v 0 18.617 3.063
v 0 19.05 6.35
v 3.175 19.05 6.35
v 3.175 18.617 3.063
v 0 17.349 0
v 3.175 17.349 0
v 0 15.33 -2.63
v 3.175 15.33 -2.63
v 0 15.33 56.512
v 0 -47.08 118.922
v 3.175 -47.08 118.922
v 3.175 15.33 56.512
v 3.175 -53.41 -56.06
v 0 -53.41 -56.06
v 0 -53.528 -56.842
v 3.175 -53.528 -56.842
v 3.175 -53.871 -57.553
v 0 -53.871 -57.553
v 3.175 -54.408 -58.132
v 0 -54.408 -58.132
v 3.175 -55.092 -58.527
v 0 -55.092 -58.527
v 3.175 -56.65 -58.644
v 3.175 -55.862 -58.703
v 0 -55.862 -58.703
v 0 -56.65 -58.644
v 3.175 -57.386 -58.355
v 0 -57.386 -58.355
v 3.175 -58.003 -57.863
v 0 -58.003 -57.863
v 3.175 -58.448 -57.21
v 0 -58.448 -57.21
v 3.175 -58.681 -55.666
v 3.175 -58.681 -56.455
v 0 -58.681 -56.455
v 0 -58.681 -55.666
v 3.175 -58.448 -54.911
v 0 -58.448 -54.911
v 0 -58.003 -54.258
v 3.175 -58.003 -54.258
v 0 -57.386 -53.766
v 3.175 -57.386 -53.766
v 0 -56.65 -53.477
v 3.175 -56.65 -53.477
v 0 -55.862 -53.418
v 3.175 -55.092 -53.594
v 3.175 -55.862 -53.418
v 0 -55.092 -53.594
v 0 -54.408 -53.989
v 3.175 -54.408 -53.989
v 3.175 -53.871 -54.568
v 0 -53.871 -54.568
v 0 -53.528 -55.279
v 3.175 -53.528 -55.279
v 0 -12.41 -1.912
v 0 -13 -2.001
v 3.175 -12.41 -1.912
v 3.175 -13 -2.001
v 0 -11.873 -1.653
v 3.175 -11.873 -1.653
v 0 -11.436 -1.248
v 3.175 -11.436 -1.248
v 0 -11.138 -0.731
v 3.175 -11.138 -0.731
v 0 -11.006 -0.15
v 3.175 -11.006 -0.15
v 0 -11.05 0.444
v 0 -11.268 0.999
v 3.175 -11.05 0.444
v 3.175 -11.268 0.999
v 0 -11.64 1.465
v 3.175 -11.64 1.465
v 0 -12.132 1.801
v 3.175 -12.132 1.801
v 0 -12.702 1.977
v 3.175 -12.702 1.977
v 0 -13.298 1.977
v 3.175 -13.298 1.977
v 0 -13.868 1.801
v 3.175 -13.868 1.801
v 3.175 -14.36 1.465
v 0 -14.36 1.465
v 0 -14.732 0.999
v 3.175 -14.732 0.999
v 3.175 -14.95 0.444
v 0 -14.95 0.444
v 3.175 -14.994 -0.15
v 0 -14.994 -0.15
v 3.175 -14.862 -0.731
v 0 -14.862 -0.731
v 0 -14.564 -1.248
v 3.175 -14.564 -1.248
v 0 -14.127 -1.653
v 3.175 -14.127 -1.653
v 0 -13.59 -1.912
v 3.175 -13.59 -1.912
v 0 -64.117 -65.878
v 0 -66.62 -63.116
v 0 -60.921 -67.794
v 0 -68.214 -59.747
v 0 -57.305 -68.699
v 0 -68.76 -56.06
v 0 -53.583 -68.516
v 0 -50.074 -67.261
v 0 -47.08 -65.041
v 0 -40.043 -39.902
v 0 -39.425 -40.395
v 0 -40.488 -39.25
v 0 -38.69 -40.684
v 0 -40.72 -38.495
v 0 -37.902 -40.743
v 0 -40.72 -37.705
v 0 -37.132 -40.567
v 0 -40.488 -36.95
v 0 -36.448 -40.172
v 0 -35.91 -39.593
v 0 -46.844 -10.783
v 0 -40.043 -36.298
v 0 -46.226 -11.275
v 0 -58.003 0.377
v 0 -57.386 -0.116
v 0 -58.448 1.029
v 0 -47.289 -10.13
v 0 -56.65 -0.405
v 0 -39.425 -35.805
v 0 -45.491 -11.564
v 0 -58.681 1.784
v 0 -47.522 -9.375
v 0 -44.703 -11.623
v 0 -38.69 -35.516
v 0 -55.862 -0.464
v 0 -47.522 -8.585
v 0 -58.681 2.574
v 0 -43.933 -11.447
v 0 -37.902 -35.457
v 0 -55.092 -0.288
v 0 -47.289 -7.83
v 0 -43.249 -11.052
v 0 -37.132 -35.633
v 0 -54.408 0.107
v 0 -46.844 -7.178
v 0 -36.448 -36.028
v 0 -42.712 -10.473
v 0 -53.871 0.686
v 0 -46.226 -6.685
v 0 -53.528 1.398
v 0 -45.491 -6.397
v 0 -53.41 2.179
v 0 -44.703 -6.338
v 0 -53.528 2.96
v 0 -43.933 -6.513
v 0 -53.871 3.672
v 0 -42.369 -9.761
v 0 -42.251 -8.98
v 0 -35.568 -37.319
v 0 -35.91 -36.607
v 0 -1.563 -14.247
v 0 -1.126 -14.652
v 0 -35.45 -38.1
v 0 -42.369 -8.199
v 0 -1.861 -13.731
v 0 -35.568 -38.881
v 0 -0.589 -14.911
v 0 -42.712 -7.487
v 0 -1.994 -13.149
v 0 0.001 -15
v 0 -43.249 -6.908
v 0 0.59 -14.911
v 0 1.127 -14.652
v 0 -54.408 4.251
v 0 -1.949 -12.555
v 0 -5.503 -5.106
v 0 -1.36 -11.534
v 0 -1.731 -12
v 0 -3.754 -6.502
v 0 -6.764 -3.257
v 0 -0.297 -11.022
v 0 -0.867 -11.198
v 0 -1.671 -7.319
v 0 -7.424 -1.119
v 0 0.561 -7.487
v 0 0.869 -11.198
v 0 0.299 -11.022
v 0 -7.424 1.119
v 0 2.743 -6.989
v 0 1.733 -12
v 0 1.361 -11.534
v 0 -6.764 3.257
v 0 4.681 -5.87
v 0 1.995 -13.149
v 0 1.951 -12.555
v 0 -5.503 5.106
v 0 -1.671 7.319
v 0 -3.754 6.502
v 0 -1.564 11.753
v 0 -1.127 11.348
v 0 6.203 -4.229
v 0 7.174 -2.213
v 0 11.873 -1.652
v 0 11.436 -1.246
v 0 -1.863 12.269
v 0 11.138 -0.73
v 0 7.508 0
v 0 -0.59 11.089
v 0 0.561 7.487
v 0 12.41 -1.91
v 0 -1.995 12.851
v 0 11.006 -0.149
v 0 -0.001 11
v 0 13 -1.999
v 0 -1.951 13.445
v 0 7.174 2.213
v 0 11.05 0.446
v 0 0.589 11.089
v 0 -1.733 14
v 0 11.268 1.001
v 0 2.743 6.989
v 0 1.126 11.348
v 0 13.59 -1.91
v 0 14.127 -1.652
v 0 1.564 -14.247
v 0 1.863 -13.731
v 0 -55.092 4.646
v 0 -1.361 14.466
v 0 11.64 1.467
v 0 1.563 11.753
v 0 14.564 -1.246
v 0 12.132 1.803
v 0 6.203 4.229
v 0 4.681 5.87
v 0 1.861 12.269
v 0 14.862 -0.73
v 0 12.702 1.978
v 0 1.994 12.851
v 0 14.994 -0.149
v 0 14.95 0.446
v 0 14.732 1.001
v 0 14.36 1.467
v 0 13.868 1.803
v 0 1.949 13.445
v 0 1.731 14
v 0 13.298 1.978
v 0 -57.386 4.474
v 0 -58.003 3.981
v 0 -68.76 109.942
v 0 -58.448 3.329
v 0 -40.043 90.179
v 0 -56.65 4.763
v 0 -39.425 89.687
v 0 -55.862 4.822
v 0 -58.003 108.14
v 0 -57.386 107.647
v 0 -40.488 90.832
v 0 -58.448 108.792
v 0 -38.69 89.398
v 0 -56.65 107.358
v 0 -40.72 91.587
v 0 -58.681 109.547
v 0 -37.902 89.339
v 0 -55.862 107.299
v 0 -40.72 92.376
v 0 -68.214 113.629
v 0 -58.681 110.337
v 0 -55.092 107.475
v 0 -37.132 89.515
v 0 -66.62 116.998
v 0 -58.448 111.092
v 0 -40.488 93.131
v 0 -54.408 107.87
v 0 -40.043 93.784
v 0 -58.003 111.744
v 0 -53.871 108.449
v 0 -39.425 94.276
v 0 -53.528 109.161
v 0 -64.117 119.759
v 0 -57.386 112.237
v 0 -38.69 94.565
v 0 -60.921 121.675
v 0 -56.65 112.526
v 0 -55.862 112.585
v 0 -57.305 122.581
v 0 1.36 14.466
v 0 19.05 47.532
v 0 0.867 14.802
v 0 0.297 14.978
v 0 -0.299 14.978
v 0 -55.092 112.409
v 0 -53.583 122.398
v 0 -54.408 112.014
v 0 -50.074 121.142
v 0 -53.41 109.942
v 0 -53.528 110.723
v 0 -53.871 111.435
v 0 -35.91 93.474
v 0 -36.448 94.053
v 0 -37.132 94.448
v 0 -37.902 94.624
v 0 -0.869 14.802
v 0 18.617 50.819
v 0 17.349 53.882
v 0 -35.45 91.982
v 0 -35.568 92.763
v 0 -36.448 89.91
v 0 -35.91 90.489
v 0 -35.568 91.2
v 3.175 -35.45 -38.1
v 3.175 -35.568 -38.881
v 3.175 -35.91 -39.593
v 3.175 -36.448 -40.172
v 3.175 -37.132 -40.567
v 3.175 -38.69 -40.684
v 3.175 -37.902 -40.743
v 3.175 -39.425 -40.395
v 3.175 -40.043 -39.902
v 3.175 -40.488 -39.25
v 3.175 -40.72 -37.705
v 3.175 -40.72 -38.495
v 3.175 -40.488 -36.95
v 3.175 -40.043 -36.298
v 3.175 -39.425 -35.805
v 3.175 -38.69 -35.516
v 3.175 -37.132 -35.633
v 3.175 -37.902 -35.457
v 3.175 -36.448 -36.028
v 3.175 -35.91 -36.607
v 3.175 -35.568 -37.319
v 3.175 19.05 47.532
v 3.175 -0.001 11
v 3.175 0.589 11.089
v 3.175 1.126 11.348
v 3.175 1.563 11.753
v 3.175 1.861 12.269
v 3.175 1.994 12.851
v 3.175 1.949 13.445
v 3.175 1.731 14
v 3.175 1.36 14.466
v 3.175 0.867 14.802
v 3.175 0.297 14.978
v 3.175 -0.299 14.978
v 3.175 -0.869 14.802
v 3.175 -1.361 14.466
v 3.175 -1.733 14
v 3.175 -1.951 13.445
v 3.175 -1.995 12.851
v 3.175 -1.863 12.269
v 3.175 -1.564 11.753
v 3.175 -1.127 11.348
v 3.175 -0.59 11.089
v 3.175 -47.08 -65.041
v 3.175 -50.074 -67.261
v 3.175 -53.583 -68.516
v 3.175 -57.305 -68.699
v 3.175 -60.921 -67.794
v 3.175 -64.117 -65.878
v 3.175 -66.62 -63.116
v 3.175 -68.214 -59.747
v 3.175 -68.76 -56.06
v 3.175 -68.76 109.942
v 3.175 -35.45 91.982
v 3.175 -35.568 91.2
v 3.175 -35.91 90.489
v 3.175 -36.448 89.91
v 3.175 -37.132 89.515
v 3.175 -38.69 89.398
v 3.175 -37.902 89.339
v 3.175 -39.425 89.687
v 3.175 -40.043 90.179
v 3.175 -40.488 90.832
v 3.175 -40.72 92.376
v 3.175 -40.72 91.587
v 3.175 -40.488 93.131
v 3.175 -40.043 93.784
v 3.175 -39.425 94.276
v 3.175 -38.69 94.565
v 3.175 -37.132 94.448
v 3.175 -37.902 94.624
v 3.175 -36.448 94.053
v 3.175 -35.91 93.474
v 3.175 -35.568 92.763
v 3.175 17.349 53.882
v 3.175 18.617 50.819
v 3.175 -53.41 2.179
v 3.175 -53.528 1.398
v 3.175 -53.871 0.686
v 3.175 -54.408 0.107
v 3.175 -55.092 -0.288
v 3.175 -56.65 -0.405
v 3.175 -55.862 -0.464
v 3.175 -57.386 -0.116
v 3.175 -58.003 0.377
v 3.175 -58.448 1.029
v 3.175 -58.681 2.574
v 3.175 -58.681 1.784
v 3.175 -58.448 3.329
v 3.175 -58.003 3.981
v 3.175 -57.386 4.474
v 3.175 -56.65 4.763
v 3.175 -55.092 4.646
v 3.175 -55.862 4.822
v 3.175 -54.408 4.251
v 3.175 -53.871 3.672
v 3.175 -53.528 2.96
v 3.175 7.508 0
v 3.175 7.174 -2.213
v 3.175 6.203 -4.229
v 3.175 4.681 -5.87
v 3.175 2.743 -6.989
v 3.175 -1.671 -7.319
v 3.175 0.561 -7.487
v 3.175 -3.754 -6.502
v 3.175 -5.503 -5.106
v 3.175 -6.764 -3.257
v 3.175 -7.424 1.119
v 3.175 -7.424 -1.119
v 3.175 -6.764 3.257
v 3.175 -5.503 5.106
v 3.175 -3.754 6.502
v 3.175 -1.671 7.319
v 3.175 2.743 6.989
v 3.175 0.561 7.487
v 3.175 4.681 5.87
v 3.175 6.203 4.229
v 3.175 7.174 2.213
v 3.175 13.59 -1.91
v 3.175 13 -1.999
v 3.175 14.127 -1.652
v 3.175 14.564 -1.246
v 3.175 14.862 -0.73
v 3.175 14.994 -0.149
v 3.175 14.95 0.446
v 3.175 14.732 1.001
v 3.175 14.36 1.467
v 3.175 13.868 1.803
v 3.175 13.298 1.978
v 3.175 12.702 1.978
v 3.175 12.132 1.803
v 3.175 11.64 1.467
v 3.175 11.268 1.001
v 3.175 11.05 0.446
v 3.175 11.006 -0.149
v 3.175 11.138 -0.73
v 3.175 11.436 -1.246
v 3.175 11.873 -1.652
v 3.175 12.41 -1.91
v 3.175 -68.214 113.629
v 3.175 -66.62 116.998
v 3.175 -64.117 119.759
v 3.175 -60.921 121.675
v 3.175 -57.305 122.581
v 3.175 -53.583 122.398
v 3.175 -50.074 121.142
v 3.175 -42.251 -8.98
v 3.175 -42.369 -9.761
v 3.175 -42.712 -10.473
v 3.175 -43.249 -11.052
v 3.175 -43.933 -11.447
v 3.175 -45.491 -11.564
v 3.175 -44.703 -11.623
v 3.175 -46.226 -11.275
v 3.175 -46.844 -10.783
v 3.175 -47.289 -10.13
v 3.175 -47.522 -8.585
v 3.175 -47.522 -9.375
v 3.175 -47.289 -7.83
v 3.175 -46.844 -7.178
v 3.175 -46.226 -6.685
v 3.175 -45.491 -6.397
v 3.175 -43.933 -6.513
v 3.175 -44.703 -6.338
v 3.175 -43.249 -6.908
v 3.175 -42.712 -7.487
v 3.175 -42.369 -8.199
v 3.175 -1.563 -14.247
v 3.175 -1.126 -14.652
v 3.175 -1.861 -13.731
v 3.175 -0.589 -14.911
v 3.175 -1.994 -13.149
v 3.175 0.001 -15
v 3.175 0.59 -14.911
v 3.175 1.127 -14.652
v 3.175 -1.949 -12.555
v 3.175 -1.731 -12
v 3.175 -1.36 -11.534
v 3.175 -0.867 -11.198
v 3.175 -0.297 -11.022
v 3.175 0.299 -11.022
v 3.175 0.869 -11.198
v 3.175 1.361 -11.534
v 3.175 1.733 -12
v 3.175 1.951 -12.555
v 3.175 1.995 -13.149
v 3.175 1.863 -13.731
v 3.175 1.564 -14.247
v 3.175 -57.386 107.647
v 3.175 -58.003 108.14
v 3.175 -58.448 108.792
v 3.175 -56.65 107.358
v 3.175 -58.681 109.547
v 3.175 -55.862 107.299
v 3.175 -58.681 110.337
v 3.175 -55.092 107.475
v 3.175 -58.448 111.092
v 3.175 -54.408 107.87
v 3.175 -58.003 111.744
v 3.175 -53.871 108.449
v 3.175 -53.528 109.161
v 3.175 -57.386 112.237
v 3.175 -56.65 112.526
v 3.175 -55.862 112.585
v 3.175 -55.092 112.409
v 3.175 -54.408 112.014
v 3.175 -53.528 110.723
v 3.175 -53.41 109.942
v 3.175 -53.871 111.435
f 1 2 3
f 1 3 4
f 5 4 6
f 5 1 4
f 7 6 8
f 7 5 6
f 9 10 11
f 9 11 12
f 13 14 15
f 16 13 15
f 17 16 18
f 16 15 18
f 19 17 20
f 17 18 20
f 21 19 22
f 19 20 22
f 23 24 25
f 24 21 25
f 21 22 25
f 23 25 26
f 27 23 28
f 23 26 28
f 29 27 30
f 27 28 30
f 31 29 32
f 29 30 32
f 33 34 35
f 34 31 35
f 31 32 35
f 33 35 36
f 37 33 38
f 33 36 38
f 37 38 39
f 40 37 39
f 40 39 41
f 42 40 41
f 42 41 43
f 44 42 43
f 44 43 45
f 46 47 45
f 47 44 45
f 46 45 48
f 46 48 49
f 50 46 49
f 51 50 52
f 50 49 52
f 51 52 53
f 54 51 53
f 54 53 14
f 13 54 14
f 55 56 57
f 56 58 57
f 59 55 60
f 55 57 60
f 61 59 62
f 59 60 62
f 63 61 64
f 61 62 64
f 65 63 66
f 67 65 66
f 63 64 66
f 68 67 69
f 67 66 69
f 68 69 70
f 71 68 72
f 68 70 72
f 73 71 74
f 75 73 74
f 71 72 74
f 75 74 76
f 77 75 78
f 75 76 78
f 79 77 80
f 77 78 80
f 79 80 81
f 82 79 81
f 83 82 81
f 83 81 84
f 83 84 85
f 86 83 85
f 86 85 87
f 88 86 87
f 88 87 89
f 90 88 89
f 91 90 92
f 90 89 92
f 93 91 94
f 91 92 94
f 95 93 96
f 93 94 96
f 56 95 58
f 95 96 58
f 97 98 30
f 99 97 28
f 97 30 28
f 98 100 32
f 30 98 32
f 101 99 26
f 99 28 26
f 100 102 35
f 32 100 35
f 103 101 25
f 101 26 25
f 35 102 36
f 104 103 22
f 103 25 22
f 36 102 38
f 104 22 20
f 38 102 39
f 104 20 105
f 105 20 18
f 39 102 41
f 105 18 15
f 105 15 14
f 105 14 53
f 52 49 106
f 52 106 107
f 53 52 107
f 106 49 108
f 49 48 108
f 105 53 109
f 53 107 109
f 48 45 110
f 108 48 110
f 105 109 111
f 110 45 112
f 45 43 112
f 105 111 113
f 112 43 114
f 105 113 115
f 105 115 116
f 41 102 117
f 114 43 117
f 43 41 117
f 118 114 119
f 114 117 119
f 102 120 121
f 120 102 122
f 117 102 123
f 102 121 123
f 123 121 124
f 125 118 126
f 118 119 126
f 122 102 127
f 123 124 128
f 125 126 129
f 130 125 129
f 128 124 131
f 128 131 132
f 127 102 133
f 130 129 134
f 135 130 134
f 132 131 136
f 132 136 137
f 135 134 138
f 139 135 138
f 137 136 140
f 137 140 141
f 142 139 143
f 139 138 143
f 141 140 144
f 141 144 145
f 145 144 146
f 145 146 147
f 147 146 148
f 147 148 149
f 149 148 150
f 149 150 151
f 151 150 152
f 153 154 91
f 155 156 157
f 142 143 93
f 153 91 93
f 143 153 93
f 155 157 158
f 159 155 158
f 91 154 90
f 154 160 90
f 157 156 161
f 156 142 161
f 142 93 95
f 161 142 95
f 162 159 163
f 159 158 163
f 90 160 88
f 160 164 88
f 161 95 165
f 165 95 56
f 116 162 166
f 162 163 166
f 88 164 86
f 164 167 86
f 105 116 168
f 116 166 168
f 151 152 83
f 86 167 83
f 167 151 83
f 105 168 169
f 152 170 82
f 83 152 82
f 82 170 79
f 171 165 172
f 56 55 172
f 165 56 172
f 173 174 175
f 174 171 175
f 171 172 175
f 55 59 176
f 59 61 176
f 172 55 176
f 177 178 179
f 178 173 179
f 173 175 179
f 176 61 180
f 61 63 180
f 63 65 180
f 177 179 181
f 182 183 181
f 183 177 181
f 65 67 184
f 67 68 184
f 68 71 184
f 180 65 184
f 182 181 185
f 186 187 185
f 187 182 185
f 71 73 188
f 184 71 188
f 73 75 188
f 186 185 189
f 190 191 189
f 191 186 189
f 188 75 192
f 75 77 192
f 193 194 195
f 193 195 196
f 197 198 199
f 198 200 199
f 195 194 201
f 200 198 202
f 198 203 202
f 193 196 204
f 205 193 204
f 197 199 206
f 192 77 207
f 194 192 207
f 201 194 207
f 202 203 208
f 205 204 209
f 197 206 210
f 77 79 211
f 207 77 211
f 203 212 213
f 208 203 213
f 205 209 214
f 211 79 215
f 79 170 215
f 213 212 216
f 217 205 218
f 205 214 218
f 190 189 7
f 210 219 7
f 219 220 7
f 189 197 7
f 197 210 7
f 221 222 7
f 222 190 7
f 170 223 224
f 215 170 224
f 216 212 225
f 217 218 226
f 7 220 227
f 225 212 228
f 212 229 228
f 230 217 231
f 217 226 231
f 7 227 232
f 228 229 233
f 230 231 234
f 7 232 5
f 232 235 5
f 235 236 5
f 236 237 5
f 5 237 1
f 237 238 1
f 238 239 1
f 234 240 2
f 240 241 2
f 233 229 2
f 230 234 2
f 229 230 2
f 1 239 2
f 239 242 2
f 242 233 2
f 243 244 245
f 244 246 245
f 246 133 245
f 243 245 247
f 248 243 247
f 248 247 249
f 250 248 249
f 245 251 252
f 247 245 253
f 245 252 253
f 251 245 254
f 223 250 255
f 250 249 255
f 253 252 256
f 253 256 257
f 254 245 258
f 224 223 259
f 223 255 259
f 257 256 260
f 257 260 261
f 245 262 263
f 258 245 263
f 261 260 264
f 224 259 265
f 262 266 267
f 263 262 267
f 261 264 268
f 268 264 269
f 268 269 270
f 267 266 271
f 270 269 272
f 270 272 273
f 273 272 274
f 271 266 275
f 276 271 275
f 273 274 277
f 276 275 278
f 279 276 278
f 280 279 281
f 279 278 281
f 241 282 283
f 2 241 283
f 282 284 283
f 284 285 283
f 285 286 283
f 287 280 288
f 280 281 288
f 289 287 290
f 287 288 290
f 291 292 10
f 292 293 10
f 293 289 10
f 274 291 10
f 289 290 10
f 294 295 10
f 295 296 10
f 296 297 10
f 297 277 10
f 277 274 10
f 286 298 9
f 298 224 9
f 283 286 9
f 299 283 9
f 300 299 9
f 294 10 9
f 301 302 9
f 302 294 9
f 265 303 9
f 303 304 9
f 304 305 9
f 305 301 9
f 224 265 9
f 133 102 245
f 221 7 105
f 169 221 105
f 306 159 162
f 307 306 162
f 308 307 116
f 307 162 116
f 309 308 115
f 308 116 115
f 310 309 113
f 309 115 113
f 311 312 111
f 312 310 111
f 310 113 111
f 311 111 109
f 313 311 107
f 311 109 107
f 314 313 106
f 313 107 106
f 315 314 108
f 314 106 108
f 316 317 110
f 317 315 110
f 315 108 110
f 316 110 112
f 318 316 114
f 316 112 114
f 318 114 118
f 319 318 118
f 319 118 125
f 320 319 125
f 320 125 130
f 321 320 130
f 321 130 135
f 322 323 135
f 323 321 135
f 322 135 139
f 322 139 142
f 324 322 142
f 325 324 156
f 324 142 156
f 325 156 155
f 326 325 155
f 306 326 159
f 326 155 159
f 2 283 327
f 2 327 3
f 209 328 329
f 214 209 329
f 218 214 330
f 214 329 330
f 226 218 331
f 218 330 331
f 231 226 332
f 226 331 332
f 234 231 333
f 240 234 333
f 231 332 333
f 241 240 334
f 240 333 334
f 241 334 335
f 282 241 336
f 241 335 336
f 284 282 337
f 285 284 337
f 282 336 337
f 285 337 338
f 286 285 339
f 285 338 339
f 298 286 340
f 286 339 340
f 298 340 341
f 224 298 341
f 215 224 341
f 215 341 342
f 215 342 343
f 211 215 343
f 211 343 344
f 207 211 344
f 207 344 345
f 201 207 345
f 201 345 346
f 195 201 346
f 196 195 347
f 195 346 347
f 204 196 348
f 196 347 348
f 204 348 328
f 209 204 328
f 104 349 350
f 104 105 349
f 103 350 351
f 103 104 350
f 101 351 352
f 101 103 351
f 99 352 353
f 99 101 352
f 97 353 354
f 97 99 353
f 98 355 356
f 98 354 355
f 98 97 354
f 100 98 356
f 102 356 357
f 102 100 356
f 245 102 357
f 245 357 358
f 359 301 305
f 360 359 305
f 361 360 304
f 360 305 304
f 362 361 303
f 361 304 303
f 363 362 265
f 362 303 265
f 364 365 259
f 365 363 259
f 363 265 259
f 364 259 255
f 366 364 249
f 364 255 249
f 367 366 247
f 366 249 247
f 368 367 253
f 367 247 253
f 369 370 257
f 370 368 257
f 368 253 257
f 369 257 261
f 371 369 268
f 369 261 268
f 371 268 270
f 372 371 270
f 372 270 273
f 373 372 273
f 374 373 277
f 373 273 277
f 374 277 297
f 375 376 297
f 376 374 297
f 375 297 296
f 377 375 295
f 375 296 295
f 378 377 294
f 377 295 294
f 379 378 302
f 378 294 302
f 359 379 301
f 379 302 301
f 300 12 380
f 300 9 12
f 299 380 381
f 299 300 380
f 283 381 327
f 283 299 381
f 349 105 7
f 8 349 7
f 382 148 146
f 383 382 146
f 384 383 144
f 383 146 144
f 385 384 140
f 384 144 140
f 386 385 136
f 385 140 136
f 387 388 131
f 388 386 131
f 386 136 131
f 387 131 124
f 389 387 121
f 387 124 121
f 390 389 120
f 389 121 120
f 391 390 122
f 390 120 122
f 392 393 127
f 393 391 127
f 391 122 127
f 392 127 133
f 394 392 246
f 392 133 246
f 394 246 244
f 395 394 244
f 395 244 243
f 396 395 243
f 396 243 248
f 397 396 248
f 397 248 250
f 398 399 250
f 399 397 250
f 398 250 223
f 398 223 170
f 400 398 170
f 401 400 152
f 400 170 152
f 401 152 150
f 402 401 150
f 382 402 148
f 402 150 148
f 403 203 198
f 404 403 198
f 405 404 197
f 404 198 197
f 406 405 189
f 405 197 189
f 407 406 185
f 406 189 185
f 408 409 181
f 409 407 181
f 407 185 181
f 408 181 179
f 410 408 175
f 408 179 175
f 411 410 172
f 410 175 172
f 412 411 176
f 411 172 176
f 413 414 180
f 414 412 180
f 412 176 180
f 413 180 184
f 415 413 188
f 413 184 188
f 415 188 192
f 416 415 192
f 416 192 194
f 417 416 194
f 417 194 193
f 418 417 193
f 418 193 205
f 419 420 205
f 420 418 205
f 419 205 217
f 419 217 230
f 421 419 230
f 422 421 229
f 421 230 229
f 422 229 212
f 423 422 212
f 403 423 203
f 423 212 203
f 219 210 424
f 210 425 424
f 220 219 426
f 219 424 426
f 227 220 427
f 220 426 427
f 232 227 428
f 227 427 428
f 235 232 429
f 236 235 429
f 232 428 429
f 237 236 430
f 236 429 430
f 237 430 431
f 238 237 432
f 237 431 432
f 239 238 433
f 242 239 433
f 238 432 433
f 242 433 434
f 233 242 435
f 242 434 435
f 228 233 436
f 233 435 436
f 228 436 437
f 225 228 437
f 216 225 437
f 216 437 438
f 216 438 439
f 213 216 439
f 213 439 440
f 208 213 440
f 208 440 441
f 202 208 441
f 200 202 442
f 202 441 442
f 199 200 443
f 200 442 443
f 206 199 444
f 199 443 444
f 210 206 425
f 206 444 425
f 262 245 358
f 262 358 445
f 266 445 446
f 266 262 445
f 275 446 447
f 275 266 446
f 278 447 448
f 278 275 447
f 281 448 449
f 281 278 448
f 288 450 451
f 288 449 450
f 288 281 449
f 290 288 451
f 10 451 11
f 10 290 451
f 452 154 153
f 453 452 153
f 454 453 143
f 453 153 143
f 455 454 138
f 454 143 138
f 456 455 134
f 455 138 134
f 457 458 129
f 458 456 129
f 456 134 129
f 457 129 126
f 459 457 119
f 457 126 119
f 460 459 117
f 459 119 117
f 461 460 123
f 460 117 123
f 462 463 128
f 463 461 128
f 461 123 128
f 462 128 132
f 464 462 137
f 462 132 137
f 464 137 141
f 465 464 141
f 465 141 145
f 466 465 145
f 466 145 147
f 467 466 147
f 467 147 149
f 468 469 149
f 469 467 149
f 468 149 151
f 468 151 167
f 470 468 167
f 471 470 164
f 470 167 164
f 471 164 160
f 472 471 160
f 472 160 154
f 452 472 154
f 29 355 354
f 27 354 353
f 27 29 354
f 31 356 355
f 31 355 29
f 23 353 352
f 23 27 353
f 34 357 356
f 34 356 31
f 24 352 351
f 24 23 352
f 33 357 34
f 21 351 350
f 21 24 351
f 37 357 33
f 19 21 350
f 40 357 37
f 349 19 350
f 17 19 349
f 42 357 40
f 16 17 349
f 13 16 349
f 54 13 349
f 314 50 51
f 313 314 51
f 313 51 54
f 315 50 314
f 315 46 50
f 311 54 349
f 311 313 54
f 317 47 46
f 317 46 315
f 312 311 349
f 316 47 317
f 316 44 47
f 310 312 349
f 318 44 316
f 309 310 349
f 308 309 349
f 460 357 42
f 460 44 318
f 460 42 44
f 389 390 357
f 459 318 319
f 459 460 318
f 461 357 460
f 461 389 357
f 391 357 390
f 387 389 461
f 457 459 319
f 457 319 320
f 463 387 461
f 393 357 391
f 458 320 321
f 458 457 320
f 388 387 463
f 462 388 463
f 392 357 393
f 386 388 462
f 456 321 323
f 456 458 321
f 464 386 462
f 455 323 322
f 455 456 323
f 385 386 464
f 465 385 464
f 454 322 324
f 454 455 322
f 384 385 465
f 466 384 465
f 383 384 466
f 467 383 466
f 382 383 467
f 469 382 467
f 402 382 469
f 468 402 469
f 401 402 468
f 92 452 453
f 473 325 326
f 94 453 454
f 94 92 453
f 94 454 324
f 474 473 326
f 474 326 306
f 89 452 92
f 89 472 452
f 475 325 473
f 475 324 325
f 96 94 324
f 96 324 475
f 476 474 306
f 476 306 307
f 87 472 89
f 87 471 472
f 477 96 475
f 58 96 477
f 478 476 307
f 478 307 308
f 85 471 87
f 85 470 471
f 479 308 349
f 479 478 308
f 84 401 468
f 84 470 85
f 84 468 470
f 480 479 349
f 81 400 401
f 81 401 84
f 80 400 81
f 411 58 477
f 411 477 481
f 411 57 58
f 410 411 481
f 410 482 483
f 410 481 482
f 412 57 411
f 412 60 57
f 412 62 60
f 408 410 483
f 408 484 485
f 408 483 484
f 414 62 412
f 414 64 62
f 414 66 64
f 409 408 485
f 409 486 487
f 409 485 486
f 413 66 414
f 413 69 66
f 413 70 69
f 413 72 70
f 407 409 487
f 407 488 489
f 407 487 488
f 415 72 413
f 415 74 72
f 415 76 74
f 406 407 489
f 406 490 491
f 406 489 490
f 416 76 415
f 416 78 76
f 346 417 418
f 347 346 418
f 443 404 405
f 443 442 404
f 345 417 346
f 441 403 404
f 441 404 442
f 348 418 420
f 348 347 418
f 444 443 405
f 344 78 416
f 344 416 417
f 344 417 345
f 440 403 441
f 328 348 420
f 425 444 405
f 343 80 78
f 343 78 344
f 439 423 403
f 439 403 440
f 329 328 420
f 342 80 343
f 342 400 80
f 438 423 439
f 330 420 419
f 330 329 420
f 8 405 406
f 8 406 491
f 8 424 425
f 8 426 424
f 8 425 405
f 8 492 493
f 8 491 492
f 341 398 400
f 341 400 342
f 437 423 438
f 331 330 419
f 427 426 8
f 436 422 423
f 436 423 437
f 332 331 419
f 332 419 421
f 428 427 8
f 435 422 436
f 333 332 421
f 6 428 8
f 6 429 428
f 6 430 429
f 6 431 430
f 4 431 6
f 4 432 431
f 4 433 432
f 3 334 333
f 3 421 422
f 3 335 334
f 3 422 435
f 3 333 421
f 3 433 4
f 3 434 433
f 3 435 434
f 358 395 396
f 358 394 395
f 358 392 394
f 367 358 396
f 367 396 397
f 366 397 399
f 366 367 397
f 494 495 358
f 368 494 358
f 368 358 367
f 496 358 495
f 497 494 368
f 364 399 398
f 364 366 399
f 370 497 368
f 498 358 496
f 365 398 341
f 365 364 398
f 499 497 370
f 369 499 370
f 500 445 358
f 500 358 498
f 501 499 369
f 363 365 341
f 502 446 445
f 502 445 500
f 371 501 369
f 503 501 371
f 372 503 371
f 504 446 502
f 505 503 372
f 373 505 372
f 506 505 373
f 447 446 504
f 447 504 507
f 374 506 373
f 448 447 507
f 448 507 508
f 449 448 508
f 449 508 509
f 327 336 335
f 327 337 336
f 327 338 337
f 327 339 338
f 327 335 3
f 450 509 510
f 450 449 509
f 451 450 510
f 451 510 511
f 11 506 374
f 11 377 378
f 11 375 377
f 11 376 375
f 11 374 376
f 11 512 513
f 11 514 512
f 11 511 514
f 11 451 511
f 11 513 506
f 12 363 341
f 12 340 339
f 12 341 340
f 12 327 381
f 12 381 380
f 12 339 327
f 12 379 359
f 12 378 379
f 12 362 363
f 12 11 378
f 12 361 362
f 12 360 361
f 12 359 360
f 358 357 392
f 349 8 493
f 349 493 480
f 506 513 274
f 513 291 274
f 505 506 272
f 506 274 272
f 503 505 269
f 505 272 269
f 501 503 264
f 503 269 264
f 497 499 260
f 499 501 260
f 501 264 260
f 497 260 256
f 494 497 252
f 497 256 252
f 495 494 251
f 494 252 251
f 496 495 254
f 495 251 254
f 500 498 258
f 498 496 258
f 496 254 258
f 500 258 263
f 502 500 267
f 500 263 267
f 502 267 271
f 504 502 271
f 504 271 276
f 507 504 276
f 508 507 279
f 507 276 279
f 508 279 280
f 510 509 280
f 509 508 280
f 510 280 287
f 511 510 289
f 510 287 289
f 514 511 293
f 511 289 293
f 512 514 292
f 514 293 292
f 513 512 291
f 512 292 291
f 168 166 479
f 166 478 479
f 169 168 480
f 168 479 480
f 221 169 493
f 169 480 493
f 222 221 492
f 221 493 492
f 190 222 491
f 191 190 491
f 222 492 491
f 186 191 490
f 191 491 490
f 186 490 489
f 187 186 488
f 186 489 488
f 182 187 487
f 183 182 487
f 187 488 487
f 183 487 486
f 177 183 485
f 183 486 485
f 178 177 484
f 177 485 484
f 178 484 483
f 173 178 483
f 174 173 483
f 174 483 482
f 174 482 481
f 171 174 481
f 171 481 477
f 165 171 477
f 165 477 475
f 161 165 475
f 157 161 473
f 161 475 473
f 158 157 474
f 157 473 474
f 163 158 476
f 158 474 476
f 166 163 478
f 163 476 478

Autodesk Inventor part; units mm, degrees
ref_plane "YZ Plane" through (0, 0, 0) normal (1, 0, 0) x (0, 1, 0)
ref_plane "XZ Plane" through (0, 0, 0) normal (0, 1, 0) x (-1, 0, 0)
ref_plane "XY Plane" through (0, 0, 0) normal (0, 0, 1) x (1, 0, 0)
sketch "Sketch1" plane through (0, 0, 0) normal (1, 0, 0) x (0, 1, 0)
  circle A0 centre (0, 0) radius 7.5075
  circle A1 centre (-56.0605, -56.0605) radius 2.65
  circle A2 centre (-38.1, -38.1) radius 2.65
  circle A3 centre (-47.0803, 100.9618) radius 2.65
  circle A4 centre (-56.0605, 109.942) radius 2.65
  circle A5 centre (-38.1, 91.9815) radius 2.65
  circle A6 centre (-47.0803, -47.0803) radius 2.65
  line L0 (-47.0803, 100.9618) -> (6.8013, 47.0803) construction
  line L1 (-35.921, 35.921) -> (0, 0) construction
  line L2 (0, 0) -> (-35.921, -35.921) construction
  line L3 (0, 0) -> (12.7, 0) construction
  line L4 (-47.0803, 118.9223) -> (15.3303, 56.5118)
  line L5 (19.05, 47.5315) -> (19.05, 6.35)
  line L6 (-68.7605, -56.0605) -> (-68.7605, 109.942)
  arc A7 (19.05, 47.5315) -> (15.3303, 56.5118) centre (6.35, 47.5315) ccw
  arc A8 (-47.0803, 118.9223) -> (-68.7605, 109.942) centre (-56.0605, 109.942) ccw
  line L7 (-47.0803, -65.0408) -> (15.3303, -2.6303)
  arc A9 (15.3303, -2.6303) -> (19.05, 6.35) centre (6.35, 6.35) ccw
  arc A10 (-68.7605, -56.0605) -> (-47.0803, -65.0408) centre (-56.0605, -56.0605) ccw
  line L8 (-26.9408, -8.9802) -> (-44.9013, -26.9407) projected
  line L9 (-44.9013, -26.9407) -> (-284.0015, 212.1595) projected
  line L10 (-266.041, 230.12) -> (-284.0015, 212.1595) projected
  line L11 (-26.9408, -8.9802) -> (-266.041, 230.12) projected
  circle A11 centre (-56.0605, 2.179) radius 2.65
  circle A12 centre (-44.9013, -8.9802) radius 2.65
  line L12 (-56.0605, 2.179) -> (-44.9013, -8.9802) construction
  point P0 (19.05, 1.0895)
  point P1 (-68.7605, -86.721)
  point P2 (-68.7605, 32.8395)
  dimension "d0" = 15.015
  dimension "d1" = 5.3
  dimension "d2" = 5.3
  dimension "d3" = 5.3
  dimension "d4" = 5.3
  dimension "d5" = 5.3
  dimension "d6" = 5.3
  dimension "d8" = 38.1
  dimension "d10" = 38.1
  dimension "d11" = 12.7
  dimension "d12" = 12.7
  dimension "d13" = 38.1
  dimension "d14" = 12.7
  dimension "d15" = 12.7
  dimension "d16" = 12.7
  dimension "d18" = 19.05
  dimension "d19" = 45
  dimension "d20" = 12.7
  dimension "d21" = 12.7
  dimension "d24" = 12.7
  dimension "d25" = 12.7
  dimension "d27" = 12.7
  dimension "d29" = 12.7
  dimension "d34" = 12.7
  dimension "d47" = 12.7
  dimension "d49" = 50.8
  dimension "d50" = 76.2
  dimension "d51" = 12.7
extrude "Extrusion2" add sketch "Sketch1" along normal blind 3.175 contours A3 | A6 | L4 A7 L5 A9 L7 A10 L6 L9 L8 L11 A8 | L11 L8 L9 L6
sketch "Sketch3" plane through (3.175, 0, 0) normal (1, 0, 0) x (0, 0, -1)
  circle A0 centre (0, 0) radius 7.5075 projected
  circle A1 centre (0, 0) radius 13 construction
  circle A2 centre (-0.0008, 13) radius 2
  line L0 (-6.35, 19.05) -> (-47.5315, 19.05) projected
  circle A3 centre (-13, -0.0008) radius 2
  circle A4 centre (0.0008, -13) radius 2
  circle A5 centre (13, 0.0008) radius 2
  dimension "d37" = 26
  dimension "d38" = 4
  dimension "d42" = 360
extrude "Extrusion3" cut sketch "Sketch3" against normal blind 25.4 contours A2 | A3 | A4 | A5
equation "\"d12\" = d11"
equation "\"d13\" = d10"
equation "\"d14\" = d11"
equation "\"d15\" = d11"
properties part number "HipPivotPlate" material "Aluminum 6061"
